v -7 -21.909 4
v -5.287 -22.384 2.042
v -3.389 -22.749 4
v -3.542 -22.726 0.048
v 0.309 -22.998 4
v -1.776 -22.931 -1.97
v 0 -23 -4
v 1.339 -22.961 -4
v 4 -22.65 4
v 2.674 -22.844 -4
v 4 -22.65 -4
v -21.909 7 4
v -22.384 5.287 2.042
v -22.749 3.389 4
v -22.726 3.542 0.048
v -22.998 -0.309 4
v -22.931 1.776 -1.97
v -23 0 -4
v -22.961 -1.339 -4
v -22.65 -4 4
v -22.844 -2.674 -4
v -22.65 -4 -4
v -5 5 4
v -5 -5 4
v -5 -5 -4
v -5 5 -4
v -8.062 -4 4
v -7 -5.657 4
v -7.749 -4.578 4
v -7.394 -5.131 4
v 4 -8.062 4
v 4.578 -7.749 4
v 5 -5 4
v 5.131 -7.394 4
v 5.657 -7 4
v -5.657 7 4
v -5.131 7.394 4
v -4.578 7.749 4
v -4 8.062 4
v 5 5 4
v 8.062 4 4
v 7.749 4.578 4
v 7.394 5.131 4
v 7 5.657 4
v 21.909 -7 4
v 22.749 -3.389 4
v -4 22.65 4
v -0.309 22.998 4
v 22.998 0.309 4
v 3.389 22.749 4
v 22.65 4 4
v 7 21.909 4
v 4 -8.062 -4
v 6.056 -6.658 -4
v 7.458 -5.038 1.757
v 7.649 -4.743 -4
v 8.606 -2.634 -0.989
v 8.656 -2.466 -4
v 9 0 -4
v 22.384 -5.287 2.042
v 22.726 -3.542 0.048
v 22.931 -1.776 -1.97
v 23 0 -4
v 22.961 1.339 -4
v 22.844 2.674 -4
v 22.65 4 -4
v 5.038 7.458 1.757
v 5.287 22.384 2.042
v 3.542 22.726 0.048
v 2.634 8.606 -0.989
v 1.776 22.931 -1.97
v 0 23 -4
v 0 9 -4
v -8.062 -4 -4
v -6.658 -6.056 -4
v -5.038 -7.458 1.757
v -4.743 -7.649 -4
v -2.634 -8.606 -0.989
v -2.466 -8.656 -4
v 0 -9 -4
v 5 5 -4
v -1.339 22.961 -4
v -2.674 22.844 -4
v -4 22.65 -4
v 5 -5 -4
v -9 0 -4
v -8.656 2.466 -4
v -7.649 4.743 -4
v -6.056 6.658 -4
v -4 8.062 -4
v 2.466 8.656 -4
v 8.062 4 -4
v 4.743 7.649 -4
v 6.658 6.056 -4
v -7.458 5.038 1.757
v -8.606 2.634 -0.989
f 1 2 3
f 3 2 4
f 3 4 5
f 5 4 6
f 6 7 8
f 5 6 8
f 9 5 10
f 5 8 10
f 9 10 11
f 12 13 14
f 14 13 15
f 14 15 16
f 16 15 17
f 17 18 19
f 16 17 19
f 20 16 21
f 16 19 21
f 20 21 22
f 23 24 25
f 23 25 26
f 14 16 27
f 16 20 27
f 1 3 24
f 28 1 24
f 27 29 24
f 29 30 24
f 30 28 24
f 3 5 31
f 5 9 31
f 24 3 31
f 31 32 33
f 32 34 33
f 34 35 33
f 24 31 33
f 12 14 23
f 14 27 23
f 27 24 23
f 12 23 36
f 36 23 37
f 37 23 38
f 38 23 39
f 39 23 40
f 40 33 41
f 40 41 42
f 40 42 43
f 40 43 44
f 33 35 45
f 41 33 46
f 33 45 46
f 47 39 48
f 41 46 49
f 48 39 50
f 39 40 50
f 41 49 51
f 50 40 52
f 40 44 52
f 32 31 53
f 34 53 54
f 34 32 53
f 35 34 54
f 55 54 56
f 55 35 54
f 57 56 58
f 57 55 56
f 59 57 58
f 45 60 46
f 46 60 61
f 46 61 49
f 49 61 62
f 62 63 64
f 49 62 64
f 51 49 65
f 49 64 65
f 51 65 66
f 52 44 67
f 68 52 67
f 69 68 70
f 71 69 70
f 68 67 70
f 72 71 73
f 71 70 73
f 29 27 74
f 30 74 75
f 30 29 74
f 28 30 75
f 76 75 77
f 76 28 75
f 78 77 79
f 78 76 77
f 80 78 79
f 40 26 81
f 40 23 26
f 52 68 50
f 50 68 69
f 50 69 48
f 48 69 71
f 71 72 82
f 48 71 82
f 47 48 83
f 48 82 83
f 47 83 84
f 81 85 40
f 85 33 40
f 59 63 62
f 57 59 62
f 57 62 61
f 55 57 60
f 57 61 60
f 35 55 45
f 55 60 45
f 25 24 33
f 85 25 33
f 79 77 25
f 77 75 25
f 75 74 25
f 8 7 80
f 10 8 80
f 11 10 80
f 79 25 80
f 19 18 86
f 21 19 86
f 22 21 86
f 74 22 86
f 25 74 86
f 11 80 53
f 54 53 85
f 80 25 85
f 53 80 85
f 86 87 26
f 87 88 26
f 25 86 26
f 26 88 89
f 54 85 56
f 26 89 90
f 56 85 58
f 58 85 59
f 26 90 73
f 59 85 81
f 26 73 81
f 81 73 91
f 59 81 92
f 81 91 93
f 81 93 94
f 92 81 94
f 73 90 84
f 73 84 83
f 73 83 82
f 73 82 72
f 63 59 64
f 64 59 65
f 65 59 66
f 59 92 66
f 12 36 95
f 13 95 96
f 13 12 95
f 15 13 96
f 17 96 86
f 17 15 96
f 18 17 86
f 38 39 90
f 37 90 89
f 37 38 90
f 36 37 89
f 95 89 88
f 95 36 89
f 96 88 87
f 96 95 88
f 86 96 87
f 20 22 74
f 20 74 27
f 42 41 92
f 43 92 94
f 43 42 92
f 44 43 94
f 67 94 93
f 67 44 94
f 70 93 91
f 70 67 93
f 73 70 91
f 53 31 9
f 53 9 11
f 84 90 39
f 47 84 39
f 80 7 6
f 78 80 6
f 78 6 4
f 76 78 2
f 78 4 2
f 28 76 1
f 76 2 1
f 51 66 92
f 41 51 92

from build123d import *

# Parameters (mm, degrees)
SKETCH1_R               = 9
SKETCH1_W               = 10
SKETCH1_H               = 10
BOSS_EXTRUDE1_DEPTH     = 4
BOSS_EXTRUDE2_START     = -28
BOSS_EXTRUDE2_DEPTH     = 31.343146
CIRPATTERN1_START       = -37
CIRPATTERN1_DEPTH       = 31.343145751
CIRPATTERN1_START_2     = 5.656854249
CIRPATTERN1_2_DEPTH     = 31.343145751
CIRPATTERN1_3_OUTLINE_W = 28
CIRPATTERN1_3_OUTLINE_H = 8
CIRPATTERN1_3_DEPTH     = 4
CIRPATTERN1_START_3     = -4
CIRPATTERN1_4_DEPTH     = 8
CIRPATTERN1_START_4     = 9
CIRPATTERN1_5_DEPTH     = 28
CUT_EXTRUDE1_START      = -4
SKETCH7_R               = 40
SKETCH7_R_2             = 23
CUT_EXTRUDE1_DEPTH      = 8
BOSS_EXTRUDE3_REACH     = 41.611


with BuildPart() as part:
    # Sketch1 → Boss-Extrude1 (new, symmetric)
    with BuildSketch(Plane.XY):
        Circle(SKETCH1_R)
        Rectangle(SKETCH1_W, SKETCH1_H, mode=Mode.SUBTRACT)
    extrude(amount=BOSS_EXTRUDE1_DEPTH, both=True)

    # Sketch4 → Boss-Extrude2 (add)
    with BuildSketch(Plane(origin=(-9, 0, 0), x_dir=(0, 0, -1), z_dir=(1, 0, 0)).offset(BOSS_EXTRUDE2_START)):
        Polygon((4, 0), (4, -4), (-4, -4), (-4, 7), align=None)
    extrude(amount=BOSS_EXTRUDE2_DEPTH)

    # CirPattern1: read off the stored shape, not the designer's step
    # CirPattern1 outline → CirPattern1 (add)
    with BuildSketch(Plane(origin=(0, 0, 0), x_dir=(1, 0, 0), z_dir=(0, 1, 0)).offset(CIRPATTERN1_START)):
        Polygon((-7, -4), (4, -4), (4, 4), (0, 4), align=None)
    extrude(amount=CIRPATTERN1_DEPTH)

    # CirPattern1 2 outline → CirPattern1 2 (add)
    with BuildSketch(Plane(origin=(0, 0, 0), x_dir=(1, 0, 0), z_dir=(0, 1, 0)).offset(CIRPATTERN1_START_2)):
        Polygon((-4, -4), (7, -4), (0, 4), (-4, 4), align=None)
    extrude(amount=CIRPATTERN1_2_DEPTH)

    # CirPattern1 3 outline → CirPattern1 3 (add)
    with BuildSketch(Plane(origin=(0, 0, 0), x_dir=(1, 0, 0), z_dir=(0, 1, 0))):
        with Locations((23, 0)):
            Rectangle(CIRPATTERN1_3_OUTLINE_W, CIRPATTERN1_3_OUTLINE_H)
    extrude(amount=CIRPATTERN1_3_DEPTH)

    # CirPattern1 4 outline → CirPattern1 4 (add)
    with BuildSketch(Plane.XY.offset(CIRPATTERN1_START_3)):
        with BuildLine():
            ThreePointArc((8.062257749, 4), (8.76242888, 2.054224947), (9, 0))
            Line((9, 0), (9, 4))
            Line((9, 4), (8.062257749, 4))
        make_face()
    extrude(amount=CIRPATTERN1_4_DEPTH)

    # CirPattern1 5 outline → CirPattern1 5 (add)
    with BuildSketch(Plane.YZ.offset(CIRPATTERN1_START_4)):
        Polygon((0, -4), (0, 4), (-7, 4), align=None)
    extrude(amount=CIRPATTERN1_5_DEPTH)

    # Sketch7 → Cut-Extrude1 (cut)
    with BuildSketch(Plane.XY.offset(CUT_EXTRUDE1_START)):
        Circle(SKETCH7_R)
        Circle(SKETCH7_R_2, mode=Mode.SUBTRACT)
    extrude(amount=CUT_EXTRUDE1_DEPTH, mode=Mode.SUBTRACT)

    # Sketch8 → Boss-Extrude3 (add, up to next)
    with BuildSketch(Plane.ZY.offset(-9), mode=Mode.PRIVATE) as boss_extrude3_sk1:
        Polygon((4, -7), (4, 0), (-4, 0), align=None)
    boss_extrude3_tool1 = extrude(boss_extrude3_sk1.sketch, amount=BOSS_EXTRUDE3_REACH, mode=Mode.PRIVATE) - part.part
    add(boss_extrude3_tool1.solids().sort_by_distance((9, -2.333333, 1.333333))[0])


solid = part.part
